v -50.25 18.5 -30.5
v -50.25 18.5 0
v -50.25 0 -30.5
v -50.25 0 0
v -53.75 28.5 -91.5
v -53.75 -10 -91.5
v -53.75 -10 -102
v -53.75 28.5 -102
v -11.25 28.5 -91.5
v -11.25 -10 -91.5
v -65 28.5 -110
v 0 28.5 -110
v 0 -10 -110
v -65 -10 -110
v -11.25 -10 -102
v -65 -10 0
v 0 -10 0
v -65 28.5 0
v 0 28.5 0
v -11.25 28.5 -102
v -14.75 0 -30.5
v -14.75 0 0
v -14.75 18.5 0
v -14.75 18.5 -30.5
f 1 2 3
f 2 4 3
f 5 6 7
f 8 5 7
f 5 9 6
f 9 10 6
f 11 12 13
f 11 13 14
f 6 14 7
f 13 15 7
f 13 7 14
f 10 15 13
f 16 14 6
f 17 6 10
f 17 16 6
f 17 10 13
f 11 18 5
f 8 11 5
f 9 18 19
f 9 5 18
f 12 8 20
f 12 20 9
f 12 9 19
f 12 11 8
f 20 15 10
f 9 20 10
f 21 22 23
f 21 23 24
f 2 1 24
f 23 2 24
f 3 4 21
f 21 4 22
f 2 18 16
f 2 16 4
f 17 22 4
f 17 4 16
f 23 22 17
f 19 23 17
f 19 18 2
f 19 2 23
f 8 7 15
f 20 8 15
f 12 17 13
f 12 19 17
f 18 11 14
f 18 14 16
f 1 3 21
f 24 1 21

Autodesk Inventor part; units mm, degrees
ref_plane "YZ Plane" through (0, 0, 0) normal (1, 0, 0) x (0, 1, 0)
ref_plane "XZ Plane" through (0, 0, 0) normal (0, 1, 0) x (-1, 0, 0)
ref_plane "XY Plane" through (0, 0, 0) normal (0, 0, 1) x (1, 0, 0)
sketch "Sketch1" plane through (0, 0, 0) normal (0, 1, 0) x (-1, 0, 0)
  line L0 (65, 0) -> (65, -110)
  line L1 (65, -110) -> (0, -110)
  line L2 (0, -110) -> (0, 0)
  line L3 (65, 0) -> (65, -34.9842)
  line L4 (65, 0) -> (50.25, 0)
  line L5 (50.25, 0) -> (50.25, -30.5)
  line L6 (0, 0) -> (14.75, 0)
  line L7 (14.75, 0) -> (14.75, -30.5)
  line L8 (50.25, -30.5) -> (14.75, -30.5)
  line L9 (0, 0) -> (14.75, 0)
  line L10 (50.25, 0) -> (65, 0)
  dimension "d0" = 65
  dimension "d1" = 110
  dimension "d2" = 14.75
  dimension "d3" = 30.5
  dimension "d4" = 14.75
  dimension "d5" = 30.5
extrude "Extrusion1" add sketch "Sketch1" along normal blind 18.5
sketch "Sketch2" plane through (0, 18.5, 0) normal (0, 1, 0) x (1, 0, 0)
  line L0 (0, 110) -> (-65, 110) projected
  line L1 (-65, 110) -> (-65, 0)
  line L2 (-14.75, 0) -> (0, 0) projected
  line L3 (-65, 0) -> (0, 0)
  line L4 (0, 0) -> (0, 110)
  line L5 (-65, 110) -> (-65, 0) projected
  line L6 (0, 110) -> (-65, 110)
extrude "Extrusion2" add sketch "Sketch2" along normal blind 10
sketch "Sketch3" plane through (0, 0, 0) normal (0, -1, 0) x (1, 0, 0)
  line L0 (0, 0) -> (0, -110) projected
  line L1 (0, -110) -> (-65, -110) projected
  line L2 (0, 0) -> (0, -110)
  line L3 (0, -110) -> (-65, -110)
  line L4 (-65, -110) -> (-65, 0) projected
  line L5 (-65, -110) -> (-65, 0)
  line L6 (-65, 0) -> (0, 0)
extrude "Extrusion3" add sketch "Sketch3" along normal blind 10
sketch "Sketch4" plane through (0, -10, 0) normal (0, -1, 0) x (1, 0, 0)
  line L0 (0, 0) -> (0, -110) projected
  line L1 (0, -110) -> (0, -102)
  line L2 (0, -110) -> (-32.5, -110)
  line L3 (-32.5, -110) -> (-24.5, -110)
  line L4 (0, -110) -> (-65, -110) projected
  line L5 (-32.5, -110) -> (-32.5, -102)
  line L6 (-32.5, -102) -> (-11.25, -102)
  line L7 (-11.25, -102) -> (-11.25, -91.5)
  line L8 (-11.25, -91.5) -> (-53.75, -91.5)
  line L9 (-53.75, -91.5) -> (-53.75, -102)
  line L10 (-53.75, -102) -> (-32.5, -102)
  dimension "d19" = 32.5
  dimension "d26" = 8
  dimension "d27" = 21.25
  dimension "d28" = 10.5
  dimension "d29" = 42.5
  dimension "d30" = 10.5
extrude "Extrusion4" cut sketch "Sketch4" against normal through all
properties part number "techo2"
